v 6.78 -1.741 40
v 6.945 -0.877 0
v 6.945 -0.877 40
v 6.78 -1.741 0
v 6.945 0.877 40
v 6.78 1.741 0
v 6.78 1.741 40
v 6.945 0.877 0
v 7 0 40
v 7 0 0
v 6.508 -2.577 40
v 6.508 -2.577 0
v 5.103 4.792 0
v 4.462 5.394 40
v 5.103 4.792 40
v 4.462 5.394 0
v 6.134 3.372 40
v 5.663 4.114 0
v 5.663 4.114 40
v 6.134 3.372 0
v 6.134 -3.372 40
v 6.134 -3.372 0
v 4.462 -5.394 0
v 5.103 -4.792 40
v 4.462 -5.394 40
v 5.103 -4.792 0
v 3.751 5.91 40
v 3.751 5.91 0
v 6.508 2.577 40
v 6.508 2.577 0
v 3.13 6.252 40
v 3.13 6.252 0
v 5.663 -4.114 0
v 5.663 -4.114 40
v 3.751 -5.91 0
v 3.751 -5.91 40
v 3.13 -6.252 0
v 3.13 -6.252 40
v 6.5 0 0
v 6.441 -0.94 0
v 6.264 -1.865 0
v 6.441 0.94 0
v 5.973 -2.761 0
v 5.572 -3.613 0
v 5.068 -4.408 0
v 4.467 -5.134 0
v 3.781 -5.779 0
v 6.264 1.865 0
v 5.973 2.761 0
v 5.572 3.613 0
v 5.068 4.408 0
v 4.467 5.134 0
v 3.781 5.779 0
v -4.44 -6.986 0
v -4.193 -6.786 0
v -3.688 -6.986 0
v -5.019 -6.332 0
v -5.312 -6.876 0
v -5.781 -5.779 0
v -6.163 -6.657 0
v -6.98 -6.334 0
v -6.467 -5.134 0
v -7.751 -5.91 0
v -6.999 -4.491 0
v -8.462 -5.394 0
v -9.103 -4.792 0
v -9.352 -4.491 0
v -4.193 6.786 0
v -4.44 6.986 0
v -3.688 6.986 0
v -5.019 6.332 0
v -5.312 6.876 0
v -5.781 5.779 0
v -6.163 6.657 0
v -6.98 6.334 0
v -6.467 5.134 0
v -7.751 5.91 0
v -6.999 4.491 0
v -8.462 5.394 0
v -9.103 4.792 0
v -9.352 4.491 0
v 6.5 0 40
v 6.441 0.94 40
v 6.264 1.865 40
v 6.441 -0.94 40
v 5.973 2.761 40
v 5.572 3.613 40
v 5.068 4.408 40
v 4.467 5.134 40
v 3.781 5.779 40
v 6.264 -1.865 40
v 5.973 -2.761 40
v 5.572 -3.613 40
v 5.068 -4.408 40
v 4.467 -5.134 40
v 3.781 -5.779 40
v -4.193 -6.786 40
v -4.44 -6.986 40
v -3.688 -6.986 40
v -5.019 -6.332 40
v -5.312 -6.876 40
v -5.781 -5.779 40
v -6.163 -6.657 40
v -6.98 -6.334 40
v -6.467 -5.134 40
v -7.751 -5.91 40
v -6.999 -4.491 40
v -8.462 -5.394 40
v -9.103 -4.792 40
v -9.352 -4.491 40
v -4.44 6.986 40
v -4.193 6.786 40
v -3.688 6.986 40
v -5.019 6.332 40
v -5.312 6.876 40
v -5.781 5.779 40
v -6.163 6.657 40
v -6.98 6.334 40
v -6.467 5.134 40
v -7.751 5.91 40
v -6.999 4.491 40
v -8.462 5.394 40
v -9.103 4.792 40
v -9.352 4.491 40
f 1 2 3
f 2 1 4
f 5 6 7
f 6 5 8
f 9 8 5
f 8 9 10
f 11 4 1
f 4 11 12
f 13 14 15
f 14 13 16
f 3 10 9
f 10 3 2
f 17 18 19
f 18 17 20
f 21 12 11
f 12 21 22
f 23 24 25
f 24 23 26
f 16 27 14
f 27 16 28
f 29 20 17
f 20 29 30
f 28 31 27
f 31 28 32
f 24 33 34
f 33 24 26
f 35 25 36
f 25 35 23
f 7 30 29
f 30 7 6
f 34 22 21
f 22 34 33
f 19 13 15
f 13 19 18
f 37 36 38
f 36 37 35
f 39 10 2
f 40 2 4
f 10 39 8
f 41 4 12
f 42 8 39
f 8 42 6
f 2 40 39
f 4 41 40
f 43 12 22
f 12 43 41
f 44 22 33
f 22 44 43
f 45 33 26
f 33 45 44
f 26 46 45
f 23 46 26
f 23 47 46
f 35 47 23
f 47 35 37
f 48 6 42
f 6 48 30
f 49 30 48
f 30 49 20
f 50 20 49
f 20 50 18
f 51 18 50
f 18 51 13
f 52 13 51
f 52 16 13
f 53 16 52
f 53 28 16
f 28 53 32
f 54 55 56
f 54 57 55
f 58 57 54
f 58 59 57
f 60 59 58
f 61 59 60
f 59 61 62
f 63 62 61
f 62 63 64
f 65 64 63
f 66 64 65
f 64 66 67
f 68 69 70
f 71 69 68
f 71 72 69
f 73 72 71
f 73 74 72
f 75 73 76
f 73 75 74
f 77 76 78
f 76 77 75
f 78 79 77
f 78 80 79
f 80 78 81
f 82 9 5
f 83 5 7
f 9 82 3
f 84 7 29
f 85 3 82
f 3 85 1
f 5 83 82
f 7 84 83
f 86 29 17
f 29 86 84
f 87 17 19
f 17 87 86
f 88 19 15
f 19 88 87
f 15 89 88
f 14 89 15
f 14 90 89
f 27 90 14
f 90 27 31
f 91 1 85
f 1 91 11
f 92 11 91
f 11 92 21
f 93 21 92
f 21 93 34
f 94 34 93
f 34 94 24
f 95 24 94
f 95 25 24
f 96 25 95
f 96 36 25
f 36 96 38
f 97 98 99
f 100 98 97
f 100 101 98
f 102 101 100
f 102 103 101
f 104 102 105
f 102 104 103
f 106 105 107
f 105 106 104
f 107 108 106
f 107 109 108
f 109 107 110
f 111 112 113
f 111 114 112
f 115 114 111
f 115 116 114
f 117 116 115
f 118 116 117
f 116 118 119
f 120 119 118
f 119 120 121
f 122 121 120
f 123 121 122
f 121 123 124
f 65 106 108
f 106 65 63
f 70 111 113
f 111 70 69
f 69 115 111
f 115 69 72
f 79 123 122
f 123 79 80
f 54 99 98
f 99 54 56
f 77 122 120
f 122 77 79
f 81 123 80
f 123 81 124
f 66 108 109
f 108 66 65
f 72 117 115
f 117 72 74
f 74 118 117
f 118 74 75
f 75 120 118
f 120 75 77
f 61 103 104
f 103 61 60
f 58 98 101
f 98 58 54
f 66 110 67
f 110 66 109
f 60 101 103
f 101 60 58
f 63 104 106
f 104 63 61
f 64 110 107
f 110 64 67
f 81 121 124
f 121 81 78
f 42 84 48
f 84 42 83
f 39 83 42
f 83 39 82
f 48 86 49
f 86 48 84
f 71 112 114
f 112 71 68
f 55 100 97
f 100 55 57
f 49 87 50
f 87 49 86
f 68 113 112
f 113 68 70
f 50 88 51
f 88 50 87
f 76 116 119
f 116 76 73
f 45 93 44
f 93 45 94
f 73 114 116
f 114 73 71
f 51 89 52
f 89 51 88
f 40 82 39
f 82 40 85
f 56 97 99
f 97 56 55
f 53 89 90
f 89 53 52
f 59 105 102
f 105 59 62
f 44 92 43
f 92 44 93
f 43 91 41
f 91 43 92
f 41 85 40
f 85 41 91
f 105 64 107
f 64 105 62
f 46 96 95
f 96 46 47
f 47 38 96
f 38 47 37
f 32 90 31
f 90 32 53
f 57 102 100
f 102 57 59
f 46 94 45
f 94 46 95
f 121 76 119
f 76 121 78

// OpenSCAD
$fn = 50;


difference() {
	union() {
		cylinder(h = 40, r = 7.0000000000);
		translate(v = [-4.0000000000, 0, 0]) {
			cylinder(h = 40, r = 7.0000000000);
		}
	}
	union() {
		cylinder(h = 40, r = 3.2500000000);
		cylinder(h = 40, r = 1.8000000000);
		cylinder(h = 40, r = 1.8000000000);
		cylinder(h = 40, r = 1.8000000000);
		translate(v = [-8.5000000000, 0, 0]) {
			hull() {
				translate(v = [-3.7500000000, 0.0000000000, 0]) {
					cylinder(h = 40, r = 4.5000000000);
				}
				translate(v = [3.7500000000, 0.0000000000, 0]) {
					cylinder(h = 40, r = 4.5000000000);
				}
				translate(v = [-3.7500000000, -0.0000000000, 0]) {
					cylinder(h = 40, r = 4.5000000000);
				}
				translate(v = [3.7500000000, -0.0000000000, 0]) {
					cylinder(h = 40, r = 4.5000000000);
				}
			}
		}
		translate(v = [-1.0000000000, 0, 0.0000000000]) {
			cylinder(h = 40, r = 7.5000000000);
		}
	}
}
